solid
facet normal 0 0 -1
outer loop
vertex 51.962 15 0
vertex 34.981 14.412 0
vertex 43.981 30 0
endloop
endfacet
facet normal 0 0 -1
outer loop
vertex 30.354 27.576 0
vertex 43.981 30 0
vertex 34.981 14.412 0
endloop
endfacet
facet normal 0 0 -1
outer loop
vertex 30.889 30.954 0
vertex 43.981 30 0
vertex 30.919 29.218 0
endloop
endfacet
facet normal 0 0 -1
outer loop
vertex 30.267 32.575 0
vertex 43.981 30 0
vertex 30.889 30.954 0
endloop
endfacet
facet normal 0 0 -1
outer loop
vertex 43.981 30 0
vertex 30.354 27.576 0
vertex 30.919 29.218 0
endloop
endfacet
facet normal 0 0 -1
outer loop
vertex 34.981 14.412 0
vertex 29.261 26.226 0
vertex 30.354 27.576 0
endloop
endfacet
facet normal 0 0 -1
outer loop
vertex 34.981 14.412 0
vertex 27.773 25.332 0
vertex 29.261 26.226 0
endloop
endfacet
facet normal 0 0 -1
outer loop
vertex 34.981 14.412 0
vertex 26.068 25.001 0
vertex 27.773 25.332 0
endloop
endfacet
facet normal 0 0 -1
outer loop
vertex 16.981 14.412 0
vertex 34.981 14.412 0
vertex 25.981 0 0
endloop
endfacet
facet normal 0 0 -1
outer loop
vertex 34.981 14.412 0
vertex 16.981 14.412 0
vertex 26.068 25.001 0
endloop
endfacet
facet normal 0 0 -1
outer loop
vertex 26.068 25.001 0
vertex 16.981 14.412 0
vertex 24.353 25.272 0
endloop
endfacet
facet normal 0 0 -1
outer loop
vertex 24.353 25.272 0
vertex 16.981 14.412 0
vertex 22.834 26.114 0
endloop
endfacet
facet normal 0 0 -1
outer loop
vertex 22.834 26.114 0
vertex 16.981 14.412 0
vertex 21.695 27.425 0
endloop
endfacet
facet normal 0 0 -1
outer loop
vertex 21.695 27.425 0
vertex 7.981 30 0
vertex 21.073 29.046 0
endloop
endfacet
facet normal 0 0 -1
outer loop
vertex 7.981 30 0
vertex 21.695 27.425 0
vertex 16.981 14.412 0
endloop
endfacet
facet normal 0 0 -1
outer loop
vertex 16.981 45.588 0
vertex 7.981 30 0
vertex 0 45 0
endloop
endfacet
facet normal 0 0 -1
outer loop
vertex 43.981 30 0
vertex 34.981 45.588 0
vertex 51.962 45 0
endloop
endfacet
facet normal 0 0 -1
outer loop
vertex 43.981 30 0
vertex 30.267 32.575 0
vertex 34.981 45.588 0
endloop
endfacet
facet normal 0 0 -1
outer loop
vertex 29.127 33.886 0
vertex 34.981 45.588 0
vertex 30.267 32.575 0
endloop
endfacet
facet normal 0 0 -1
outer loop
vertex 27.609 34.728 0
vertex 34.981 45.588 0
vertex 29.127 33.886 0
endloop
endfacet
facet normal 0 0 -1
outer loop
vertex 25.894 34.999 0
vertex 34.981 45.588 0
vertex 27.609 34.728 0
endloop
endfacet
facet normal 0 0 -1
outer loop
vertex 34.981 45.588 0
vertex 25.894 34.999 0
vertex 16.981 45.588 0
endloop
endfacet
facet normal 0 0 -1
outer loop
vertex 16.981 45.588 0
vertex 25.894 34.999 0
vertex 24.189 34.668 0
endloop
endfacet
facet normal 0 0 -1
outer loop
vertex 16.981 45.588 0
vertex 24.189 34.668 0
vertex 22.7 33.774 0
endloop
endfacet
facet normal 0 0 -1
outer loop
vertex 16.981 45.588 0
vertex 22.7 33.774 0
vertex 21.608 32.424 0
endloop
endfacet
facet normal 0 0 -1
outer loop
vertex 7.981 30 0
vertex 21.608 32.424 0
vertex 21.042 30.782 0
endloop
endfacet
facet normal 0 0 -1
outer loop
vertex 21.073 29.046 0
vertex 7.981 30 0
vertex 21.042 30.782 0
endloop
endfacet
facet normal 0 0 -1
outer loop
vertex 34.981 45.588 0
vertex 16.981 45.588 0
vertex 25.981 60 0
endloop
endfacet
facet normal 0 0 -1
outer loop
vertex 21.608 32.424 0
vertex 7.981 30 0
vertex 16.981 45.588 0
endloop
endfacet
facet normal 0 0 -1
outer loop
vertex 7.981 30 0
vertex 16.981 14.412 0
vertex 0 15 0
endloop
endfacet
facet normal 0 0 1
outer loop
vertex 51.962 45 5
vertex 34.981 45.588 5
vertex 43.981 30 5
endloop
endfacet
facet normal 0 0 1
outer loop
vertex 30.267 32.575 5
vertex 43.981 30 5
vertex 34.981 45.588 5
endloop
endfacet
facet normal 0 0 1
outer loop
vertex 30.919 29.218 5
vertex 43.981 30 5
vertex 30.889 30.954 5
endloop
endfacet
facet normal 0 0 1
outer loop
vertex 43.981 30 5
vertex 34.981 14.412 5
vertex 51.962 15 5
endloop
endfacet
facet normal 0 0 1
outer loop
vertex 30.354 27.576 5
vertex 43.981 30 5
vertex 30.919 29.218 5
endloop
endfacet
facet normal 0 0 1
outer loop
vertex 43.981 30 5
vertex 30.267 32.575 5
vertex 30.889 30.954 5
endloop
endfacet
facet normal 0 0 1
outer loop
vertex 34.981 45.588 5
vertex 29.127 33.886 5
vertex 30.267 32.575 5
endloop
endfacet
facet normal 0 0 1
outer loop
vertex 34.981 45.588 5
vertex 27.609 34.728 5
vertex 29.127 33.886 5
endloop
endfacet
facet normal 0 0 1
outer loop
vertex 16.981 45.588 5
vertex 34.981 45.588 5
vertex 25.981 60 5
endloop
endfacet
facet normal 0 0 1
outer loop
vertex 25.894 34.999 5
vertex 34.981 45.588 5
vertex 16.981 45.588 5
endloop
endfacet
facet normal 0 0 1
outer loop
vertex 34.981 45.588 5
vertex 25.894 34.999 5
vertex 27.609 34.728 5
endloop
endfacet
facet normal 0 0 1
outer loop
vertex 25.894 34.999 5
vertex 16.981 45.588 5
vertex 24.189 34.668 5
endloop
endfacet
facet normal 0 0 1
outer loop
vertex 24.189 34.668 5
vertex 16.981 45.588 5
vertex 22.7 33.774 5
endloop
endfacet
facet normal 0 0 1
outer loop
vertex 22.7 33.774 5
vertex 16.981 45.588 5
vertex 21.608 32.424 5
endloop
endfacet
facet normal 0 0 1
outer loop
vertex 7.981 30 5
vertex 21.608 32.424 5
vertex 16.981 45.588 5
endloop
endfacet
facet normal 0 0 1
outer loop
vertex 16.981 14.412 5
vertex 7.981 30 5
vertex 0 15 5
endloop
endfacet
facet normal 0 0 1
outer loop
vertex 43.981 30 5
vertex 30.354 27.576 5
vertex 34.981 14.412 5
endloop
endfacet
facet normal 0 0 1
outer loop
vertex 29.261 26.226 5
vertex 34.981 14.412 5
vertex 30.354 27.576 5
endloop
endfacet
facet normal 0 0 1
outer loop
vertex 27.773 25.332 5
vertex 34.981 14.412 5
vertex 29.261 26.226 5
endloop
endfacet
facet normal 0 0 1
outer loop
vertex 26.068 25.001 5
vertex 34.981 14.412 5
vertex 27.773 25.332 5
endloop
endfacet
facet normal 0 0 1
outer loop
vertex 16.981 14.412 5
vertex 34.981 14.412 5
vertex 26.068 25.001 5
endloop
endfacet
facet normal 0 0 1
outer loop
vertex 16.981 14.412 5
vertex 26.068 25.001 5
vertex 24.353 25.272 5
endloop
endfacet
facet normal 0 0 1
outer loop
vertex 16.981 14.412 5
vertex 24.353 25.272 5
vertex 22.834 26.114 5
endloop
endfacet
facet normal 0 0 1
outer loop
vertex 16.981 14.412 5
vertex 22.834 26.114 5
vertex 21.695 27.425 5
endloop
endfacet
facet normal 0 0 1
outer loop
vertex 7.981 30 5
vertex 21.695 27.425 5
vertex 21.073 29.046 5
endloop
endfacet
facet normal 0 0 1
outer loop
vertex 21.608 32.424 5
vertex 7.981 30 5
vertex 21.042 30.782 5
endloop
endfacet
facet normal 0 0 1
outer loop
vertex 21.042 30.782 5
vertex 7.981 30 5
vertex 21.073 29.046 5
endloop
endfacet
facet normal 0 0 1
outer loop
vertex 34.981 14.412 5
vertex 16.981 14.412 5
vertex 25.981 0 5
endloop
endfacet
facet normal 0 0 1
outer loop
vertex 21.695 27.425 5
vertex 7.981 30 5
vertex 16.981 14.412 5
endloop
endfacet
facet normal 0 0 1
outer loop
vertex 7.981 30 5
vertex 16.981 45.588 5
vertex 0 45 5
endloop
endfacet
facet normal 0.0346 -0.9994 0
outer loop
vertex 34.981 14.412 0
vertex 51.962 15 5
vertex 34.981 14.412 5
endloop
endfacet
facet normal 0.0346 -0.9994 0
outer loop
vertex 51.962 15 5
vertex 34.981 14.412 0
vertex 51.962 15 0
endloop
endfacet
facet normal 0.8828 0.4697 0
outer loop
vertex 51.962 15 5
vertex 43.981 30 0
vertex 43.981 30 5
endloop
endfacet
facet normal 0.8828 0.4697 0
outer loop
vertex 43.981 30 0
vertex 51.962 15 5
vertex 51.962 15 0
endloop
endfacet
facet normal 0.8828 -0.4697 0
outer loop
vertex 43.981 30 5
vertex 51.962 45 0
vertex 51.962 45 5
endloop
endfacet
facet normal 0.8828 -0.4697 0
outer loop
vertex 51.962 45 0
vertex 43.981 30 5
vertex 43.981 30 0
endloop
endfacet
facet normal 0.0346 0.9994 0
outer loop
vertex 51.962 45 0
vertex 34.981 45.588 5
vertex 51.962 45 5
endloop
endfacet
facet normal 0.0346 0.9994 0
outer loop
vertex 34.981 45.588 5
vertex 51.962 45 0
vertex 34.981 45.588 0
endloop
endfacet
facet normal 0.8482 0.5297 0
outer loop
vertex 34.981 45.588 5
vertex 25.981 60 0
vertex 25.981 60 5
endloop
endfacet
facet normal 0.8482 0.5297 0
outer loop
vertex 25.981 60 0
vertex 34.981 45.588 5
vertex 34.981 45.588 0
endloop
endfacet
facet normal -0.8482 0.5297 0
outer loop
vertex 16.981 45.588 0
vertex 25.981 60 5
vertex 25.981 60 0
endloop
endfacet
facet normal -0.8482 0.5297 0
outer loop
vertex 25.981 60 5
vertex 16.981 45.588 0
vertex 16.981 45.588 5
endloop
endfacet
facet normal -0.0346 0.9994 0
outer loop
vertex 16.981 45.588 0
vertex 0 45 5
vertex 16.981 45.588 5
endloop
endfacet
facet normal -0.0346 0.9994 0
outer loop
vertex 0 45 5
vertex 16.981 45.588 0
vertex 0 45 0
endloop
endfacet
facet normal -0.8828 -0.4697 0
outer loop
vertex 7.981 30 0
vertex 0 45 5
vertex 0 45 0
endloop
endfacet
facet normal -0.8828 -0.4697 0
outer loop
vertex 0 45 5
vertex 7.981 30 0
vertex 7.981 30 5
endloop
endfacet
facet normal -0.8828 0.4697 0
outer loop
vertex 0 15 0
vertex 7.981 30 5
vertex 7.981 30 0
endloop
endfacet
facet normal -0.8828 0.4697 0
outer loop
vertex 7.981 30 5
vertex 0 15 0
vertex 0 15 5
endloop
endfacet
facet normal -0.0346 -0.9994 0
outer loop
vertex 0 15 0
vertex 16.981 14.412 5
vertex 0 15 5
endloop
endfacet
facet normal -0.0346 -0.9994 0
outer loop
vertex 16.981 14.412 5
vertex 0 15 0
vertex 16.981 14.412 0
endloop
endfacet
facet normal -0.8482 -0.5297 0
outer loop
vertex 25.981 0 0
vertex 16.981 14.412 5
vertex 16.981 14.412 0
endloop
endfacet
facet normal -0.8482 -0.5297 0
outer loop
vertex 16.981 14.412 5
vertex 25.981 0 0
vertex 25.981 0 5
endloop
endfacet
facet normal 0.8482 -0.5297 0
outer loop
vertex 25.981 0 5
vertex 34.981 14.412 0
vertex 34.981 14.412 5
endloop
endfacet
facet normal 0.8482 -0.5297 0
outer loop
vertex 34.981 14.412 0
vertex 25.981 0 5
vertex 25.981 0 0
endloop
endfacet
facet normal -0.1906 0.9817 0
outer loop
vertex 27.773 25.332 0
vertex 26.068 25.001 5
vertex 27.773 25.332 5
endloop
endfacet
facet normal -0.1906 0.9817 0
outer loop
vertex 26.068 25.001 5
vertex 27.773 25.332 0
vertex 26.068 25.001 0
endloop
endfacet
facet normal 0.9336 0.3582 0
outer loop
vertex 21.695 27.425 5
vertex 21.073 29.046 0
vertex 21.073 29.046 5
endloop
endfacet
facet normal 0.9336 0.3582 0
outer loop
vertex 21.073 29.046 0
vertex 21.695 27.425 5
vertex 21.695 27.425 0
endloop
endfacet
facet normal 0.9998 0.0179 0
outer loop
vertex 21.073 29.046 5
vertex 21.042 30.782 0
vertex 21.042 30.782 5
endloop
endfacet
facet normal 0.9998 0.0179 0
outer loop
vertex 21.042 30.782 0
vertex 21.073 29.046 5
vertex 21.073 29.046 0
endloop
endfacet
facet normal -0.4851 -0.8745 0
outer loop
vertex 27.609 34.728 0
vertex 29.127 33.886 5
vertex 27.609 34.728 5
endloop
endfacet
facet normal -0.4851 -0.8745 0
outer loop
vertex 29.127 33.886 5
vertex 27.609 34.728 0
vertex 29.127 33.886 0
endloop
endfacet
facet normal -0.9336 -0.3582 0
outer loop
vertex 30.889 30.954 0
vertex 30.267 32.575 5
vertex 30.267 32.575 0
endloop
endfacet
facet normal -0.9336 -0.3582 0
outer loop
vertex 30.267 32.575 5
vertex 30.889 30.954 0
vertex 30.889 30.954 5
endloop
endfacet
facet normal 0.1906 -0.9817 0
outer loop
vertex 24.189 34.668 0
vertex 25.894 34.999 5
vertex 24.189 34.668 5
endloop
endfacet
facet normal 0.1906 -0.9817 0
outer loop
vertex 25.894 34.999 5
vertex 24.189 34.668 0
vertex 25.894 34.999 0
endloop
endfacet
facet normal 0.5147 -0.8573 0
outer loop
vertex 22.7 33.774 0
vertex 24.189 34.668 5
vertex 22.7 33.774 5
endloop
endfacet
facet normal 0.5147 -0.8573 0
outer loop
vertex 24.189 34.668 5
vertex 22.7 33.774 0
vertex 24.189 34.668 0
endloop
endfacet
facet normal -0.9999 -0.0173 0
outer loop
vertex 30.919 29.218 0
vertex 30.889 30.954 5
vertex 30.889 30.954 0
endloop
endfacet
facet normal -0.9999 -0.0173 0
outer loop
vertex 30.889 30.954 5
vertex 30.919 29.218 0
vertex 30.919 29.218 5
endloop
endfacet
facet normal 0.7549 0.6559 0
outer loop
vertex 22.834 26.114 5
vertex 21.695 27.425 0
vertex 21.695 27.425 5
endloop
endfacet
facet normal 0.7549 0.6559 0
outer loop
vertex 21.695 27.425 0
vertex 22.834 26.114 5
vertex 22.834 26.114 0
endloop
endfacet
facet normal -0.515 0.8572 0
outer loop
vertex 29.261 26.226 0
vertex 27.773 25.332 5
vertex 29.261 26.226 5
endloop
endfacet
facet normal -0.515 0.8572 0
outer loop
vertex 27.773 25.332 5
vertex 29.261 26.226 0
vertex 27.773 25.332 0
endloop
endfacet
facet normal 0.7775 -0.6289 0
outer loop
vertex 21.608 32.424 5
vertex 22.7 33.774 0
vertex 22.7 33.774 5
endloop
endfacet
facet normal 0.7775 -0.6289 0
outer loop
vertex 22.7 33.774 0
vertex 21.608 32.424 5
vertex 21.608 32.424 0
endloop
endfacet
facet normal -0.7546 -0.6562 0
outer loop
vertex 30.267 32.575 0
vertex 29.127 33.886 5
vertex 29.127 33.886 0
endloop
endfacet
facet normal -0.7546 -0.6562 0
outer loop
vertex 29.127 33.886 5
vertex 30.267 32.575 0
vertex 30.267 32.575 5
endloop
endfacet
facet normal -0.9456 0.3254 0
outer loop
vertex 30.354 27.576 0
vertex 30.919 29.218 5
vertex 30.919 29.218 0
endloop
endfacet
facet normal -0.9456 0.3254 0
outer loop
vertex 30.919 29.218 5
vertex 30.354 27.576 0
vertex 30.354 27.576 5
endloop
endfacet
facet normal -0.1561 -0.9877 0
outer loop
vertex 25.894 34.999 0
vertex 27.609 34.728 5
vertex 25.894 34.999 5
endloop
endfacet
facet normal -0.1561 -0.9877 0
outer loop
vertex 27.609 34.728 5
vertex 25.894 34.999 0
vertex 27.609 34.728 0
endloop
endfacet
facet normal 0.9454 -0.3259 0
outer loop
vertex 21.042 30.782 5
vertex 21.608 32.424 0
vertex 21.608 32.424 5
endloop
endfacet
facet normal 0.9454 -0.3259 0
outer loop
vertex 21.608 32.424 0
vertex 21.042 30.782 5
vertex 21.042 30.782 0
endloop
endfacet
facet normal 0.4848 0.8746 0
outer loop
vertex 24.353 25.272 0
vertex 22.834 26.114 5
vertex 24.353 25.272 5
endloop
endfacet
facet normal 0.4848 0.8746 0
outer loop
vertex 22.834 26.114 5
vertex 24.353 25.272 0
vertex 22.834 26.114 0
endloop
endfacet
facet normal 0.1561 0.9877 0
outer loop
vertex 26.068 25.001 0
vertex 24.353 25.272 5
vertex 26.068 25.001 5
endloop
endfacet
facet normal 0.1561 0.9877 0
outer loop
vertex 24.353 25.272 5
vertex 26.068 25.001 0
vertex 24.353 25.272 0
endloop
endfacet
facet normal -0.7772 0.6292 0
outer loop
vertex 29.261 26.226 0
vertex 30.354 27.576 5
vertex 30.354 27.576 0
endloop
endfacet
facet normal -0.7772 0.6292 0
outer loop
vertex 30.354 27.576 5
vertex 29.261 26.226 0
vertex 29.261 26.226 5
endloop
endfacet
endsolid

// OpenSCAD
$fn = 32;

// ----------------------------------------------------------------------
// Star wheel: 6-point star, R30
// ----------------------------------------------------------------------

// --- parameters (mm) ---
n_points = 6;             // number of points / teeth
r_out = 30;               // tip radius
r_in = 18;                // root radius
bore_r = 5;               // centre bore radius
plate_t = 5;              // plate thickness, Z (extrusion height)
bore_d = 10;              // centre bore diameter

profile = [[25.981, 60], [16.981, 45.588], [0, 45], [7.981, 30], [0, 15], [16.981, 14.412], [25.981, 0], [34.981, 14.412], [51.962, 15], [43.981, 30], [51.962, 45], [34.981, 45.588]];  // primary outline, 12 points, counter clockwise
void_1 = [[30.889, 30.954], [30.267, 32.575], [29.127, 33.886], [27.609, 34.728], [25.894, 34.999], [24.189, 34.668], [22.7, 33.774], [21.608, 32.424], [21.042, 30.782], [21.073, 29.046], [21.695, 27.425], [22.834, 26.114], [24.353, 25.272], [26.068, 25.001], [27.773, 25.332], [29.261, 26.226], [30.354, 27.576], [30.919, 29.218]];  // centre bore, 18 points

// --- the one profile operation ---
difference() {
  linear_extrude(height = plate_t) polygon(points = profile);
  translate([0, 0, -1])
    linear_extrude(height = plate_t + 2) polygon(points = void_1);
}
